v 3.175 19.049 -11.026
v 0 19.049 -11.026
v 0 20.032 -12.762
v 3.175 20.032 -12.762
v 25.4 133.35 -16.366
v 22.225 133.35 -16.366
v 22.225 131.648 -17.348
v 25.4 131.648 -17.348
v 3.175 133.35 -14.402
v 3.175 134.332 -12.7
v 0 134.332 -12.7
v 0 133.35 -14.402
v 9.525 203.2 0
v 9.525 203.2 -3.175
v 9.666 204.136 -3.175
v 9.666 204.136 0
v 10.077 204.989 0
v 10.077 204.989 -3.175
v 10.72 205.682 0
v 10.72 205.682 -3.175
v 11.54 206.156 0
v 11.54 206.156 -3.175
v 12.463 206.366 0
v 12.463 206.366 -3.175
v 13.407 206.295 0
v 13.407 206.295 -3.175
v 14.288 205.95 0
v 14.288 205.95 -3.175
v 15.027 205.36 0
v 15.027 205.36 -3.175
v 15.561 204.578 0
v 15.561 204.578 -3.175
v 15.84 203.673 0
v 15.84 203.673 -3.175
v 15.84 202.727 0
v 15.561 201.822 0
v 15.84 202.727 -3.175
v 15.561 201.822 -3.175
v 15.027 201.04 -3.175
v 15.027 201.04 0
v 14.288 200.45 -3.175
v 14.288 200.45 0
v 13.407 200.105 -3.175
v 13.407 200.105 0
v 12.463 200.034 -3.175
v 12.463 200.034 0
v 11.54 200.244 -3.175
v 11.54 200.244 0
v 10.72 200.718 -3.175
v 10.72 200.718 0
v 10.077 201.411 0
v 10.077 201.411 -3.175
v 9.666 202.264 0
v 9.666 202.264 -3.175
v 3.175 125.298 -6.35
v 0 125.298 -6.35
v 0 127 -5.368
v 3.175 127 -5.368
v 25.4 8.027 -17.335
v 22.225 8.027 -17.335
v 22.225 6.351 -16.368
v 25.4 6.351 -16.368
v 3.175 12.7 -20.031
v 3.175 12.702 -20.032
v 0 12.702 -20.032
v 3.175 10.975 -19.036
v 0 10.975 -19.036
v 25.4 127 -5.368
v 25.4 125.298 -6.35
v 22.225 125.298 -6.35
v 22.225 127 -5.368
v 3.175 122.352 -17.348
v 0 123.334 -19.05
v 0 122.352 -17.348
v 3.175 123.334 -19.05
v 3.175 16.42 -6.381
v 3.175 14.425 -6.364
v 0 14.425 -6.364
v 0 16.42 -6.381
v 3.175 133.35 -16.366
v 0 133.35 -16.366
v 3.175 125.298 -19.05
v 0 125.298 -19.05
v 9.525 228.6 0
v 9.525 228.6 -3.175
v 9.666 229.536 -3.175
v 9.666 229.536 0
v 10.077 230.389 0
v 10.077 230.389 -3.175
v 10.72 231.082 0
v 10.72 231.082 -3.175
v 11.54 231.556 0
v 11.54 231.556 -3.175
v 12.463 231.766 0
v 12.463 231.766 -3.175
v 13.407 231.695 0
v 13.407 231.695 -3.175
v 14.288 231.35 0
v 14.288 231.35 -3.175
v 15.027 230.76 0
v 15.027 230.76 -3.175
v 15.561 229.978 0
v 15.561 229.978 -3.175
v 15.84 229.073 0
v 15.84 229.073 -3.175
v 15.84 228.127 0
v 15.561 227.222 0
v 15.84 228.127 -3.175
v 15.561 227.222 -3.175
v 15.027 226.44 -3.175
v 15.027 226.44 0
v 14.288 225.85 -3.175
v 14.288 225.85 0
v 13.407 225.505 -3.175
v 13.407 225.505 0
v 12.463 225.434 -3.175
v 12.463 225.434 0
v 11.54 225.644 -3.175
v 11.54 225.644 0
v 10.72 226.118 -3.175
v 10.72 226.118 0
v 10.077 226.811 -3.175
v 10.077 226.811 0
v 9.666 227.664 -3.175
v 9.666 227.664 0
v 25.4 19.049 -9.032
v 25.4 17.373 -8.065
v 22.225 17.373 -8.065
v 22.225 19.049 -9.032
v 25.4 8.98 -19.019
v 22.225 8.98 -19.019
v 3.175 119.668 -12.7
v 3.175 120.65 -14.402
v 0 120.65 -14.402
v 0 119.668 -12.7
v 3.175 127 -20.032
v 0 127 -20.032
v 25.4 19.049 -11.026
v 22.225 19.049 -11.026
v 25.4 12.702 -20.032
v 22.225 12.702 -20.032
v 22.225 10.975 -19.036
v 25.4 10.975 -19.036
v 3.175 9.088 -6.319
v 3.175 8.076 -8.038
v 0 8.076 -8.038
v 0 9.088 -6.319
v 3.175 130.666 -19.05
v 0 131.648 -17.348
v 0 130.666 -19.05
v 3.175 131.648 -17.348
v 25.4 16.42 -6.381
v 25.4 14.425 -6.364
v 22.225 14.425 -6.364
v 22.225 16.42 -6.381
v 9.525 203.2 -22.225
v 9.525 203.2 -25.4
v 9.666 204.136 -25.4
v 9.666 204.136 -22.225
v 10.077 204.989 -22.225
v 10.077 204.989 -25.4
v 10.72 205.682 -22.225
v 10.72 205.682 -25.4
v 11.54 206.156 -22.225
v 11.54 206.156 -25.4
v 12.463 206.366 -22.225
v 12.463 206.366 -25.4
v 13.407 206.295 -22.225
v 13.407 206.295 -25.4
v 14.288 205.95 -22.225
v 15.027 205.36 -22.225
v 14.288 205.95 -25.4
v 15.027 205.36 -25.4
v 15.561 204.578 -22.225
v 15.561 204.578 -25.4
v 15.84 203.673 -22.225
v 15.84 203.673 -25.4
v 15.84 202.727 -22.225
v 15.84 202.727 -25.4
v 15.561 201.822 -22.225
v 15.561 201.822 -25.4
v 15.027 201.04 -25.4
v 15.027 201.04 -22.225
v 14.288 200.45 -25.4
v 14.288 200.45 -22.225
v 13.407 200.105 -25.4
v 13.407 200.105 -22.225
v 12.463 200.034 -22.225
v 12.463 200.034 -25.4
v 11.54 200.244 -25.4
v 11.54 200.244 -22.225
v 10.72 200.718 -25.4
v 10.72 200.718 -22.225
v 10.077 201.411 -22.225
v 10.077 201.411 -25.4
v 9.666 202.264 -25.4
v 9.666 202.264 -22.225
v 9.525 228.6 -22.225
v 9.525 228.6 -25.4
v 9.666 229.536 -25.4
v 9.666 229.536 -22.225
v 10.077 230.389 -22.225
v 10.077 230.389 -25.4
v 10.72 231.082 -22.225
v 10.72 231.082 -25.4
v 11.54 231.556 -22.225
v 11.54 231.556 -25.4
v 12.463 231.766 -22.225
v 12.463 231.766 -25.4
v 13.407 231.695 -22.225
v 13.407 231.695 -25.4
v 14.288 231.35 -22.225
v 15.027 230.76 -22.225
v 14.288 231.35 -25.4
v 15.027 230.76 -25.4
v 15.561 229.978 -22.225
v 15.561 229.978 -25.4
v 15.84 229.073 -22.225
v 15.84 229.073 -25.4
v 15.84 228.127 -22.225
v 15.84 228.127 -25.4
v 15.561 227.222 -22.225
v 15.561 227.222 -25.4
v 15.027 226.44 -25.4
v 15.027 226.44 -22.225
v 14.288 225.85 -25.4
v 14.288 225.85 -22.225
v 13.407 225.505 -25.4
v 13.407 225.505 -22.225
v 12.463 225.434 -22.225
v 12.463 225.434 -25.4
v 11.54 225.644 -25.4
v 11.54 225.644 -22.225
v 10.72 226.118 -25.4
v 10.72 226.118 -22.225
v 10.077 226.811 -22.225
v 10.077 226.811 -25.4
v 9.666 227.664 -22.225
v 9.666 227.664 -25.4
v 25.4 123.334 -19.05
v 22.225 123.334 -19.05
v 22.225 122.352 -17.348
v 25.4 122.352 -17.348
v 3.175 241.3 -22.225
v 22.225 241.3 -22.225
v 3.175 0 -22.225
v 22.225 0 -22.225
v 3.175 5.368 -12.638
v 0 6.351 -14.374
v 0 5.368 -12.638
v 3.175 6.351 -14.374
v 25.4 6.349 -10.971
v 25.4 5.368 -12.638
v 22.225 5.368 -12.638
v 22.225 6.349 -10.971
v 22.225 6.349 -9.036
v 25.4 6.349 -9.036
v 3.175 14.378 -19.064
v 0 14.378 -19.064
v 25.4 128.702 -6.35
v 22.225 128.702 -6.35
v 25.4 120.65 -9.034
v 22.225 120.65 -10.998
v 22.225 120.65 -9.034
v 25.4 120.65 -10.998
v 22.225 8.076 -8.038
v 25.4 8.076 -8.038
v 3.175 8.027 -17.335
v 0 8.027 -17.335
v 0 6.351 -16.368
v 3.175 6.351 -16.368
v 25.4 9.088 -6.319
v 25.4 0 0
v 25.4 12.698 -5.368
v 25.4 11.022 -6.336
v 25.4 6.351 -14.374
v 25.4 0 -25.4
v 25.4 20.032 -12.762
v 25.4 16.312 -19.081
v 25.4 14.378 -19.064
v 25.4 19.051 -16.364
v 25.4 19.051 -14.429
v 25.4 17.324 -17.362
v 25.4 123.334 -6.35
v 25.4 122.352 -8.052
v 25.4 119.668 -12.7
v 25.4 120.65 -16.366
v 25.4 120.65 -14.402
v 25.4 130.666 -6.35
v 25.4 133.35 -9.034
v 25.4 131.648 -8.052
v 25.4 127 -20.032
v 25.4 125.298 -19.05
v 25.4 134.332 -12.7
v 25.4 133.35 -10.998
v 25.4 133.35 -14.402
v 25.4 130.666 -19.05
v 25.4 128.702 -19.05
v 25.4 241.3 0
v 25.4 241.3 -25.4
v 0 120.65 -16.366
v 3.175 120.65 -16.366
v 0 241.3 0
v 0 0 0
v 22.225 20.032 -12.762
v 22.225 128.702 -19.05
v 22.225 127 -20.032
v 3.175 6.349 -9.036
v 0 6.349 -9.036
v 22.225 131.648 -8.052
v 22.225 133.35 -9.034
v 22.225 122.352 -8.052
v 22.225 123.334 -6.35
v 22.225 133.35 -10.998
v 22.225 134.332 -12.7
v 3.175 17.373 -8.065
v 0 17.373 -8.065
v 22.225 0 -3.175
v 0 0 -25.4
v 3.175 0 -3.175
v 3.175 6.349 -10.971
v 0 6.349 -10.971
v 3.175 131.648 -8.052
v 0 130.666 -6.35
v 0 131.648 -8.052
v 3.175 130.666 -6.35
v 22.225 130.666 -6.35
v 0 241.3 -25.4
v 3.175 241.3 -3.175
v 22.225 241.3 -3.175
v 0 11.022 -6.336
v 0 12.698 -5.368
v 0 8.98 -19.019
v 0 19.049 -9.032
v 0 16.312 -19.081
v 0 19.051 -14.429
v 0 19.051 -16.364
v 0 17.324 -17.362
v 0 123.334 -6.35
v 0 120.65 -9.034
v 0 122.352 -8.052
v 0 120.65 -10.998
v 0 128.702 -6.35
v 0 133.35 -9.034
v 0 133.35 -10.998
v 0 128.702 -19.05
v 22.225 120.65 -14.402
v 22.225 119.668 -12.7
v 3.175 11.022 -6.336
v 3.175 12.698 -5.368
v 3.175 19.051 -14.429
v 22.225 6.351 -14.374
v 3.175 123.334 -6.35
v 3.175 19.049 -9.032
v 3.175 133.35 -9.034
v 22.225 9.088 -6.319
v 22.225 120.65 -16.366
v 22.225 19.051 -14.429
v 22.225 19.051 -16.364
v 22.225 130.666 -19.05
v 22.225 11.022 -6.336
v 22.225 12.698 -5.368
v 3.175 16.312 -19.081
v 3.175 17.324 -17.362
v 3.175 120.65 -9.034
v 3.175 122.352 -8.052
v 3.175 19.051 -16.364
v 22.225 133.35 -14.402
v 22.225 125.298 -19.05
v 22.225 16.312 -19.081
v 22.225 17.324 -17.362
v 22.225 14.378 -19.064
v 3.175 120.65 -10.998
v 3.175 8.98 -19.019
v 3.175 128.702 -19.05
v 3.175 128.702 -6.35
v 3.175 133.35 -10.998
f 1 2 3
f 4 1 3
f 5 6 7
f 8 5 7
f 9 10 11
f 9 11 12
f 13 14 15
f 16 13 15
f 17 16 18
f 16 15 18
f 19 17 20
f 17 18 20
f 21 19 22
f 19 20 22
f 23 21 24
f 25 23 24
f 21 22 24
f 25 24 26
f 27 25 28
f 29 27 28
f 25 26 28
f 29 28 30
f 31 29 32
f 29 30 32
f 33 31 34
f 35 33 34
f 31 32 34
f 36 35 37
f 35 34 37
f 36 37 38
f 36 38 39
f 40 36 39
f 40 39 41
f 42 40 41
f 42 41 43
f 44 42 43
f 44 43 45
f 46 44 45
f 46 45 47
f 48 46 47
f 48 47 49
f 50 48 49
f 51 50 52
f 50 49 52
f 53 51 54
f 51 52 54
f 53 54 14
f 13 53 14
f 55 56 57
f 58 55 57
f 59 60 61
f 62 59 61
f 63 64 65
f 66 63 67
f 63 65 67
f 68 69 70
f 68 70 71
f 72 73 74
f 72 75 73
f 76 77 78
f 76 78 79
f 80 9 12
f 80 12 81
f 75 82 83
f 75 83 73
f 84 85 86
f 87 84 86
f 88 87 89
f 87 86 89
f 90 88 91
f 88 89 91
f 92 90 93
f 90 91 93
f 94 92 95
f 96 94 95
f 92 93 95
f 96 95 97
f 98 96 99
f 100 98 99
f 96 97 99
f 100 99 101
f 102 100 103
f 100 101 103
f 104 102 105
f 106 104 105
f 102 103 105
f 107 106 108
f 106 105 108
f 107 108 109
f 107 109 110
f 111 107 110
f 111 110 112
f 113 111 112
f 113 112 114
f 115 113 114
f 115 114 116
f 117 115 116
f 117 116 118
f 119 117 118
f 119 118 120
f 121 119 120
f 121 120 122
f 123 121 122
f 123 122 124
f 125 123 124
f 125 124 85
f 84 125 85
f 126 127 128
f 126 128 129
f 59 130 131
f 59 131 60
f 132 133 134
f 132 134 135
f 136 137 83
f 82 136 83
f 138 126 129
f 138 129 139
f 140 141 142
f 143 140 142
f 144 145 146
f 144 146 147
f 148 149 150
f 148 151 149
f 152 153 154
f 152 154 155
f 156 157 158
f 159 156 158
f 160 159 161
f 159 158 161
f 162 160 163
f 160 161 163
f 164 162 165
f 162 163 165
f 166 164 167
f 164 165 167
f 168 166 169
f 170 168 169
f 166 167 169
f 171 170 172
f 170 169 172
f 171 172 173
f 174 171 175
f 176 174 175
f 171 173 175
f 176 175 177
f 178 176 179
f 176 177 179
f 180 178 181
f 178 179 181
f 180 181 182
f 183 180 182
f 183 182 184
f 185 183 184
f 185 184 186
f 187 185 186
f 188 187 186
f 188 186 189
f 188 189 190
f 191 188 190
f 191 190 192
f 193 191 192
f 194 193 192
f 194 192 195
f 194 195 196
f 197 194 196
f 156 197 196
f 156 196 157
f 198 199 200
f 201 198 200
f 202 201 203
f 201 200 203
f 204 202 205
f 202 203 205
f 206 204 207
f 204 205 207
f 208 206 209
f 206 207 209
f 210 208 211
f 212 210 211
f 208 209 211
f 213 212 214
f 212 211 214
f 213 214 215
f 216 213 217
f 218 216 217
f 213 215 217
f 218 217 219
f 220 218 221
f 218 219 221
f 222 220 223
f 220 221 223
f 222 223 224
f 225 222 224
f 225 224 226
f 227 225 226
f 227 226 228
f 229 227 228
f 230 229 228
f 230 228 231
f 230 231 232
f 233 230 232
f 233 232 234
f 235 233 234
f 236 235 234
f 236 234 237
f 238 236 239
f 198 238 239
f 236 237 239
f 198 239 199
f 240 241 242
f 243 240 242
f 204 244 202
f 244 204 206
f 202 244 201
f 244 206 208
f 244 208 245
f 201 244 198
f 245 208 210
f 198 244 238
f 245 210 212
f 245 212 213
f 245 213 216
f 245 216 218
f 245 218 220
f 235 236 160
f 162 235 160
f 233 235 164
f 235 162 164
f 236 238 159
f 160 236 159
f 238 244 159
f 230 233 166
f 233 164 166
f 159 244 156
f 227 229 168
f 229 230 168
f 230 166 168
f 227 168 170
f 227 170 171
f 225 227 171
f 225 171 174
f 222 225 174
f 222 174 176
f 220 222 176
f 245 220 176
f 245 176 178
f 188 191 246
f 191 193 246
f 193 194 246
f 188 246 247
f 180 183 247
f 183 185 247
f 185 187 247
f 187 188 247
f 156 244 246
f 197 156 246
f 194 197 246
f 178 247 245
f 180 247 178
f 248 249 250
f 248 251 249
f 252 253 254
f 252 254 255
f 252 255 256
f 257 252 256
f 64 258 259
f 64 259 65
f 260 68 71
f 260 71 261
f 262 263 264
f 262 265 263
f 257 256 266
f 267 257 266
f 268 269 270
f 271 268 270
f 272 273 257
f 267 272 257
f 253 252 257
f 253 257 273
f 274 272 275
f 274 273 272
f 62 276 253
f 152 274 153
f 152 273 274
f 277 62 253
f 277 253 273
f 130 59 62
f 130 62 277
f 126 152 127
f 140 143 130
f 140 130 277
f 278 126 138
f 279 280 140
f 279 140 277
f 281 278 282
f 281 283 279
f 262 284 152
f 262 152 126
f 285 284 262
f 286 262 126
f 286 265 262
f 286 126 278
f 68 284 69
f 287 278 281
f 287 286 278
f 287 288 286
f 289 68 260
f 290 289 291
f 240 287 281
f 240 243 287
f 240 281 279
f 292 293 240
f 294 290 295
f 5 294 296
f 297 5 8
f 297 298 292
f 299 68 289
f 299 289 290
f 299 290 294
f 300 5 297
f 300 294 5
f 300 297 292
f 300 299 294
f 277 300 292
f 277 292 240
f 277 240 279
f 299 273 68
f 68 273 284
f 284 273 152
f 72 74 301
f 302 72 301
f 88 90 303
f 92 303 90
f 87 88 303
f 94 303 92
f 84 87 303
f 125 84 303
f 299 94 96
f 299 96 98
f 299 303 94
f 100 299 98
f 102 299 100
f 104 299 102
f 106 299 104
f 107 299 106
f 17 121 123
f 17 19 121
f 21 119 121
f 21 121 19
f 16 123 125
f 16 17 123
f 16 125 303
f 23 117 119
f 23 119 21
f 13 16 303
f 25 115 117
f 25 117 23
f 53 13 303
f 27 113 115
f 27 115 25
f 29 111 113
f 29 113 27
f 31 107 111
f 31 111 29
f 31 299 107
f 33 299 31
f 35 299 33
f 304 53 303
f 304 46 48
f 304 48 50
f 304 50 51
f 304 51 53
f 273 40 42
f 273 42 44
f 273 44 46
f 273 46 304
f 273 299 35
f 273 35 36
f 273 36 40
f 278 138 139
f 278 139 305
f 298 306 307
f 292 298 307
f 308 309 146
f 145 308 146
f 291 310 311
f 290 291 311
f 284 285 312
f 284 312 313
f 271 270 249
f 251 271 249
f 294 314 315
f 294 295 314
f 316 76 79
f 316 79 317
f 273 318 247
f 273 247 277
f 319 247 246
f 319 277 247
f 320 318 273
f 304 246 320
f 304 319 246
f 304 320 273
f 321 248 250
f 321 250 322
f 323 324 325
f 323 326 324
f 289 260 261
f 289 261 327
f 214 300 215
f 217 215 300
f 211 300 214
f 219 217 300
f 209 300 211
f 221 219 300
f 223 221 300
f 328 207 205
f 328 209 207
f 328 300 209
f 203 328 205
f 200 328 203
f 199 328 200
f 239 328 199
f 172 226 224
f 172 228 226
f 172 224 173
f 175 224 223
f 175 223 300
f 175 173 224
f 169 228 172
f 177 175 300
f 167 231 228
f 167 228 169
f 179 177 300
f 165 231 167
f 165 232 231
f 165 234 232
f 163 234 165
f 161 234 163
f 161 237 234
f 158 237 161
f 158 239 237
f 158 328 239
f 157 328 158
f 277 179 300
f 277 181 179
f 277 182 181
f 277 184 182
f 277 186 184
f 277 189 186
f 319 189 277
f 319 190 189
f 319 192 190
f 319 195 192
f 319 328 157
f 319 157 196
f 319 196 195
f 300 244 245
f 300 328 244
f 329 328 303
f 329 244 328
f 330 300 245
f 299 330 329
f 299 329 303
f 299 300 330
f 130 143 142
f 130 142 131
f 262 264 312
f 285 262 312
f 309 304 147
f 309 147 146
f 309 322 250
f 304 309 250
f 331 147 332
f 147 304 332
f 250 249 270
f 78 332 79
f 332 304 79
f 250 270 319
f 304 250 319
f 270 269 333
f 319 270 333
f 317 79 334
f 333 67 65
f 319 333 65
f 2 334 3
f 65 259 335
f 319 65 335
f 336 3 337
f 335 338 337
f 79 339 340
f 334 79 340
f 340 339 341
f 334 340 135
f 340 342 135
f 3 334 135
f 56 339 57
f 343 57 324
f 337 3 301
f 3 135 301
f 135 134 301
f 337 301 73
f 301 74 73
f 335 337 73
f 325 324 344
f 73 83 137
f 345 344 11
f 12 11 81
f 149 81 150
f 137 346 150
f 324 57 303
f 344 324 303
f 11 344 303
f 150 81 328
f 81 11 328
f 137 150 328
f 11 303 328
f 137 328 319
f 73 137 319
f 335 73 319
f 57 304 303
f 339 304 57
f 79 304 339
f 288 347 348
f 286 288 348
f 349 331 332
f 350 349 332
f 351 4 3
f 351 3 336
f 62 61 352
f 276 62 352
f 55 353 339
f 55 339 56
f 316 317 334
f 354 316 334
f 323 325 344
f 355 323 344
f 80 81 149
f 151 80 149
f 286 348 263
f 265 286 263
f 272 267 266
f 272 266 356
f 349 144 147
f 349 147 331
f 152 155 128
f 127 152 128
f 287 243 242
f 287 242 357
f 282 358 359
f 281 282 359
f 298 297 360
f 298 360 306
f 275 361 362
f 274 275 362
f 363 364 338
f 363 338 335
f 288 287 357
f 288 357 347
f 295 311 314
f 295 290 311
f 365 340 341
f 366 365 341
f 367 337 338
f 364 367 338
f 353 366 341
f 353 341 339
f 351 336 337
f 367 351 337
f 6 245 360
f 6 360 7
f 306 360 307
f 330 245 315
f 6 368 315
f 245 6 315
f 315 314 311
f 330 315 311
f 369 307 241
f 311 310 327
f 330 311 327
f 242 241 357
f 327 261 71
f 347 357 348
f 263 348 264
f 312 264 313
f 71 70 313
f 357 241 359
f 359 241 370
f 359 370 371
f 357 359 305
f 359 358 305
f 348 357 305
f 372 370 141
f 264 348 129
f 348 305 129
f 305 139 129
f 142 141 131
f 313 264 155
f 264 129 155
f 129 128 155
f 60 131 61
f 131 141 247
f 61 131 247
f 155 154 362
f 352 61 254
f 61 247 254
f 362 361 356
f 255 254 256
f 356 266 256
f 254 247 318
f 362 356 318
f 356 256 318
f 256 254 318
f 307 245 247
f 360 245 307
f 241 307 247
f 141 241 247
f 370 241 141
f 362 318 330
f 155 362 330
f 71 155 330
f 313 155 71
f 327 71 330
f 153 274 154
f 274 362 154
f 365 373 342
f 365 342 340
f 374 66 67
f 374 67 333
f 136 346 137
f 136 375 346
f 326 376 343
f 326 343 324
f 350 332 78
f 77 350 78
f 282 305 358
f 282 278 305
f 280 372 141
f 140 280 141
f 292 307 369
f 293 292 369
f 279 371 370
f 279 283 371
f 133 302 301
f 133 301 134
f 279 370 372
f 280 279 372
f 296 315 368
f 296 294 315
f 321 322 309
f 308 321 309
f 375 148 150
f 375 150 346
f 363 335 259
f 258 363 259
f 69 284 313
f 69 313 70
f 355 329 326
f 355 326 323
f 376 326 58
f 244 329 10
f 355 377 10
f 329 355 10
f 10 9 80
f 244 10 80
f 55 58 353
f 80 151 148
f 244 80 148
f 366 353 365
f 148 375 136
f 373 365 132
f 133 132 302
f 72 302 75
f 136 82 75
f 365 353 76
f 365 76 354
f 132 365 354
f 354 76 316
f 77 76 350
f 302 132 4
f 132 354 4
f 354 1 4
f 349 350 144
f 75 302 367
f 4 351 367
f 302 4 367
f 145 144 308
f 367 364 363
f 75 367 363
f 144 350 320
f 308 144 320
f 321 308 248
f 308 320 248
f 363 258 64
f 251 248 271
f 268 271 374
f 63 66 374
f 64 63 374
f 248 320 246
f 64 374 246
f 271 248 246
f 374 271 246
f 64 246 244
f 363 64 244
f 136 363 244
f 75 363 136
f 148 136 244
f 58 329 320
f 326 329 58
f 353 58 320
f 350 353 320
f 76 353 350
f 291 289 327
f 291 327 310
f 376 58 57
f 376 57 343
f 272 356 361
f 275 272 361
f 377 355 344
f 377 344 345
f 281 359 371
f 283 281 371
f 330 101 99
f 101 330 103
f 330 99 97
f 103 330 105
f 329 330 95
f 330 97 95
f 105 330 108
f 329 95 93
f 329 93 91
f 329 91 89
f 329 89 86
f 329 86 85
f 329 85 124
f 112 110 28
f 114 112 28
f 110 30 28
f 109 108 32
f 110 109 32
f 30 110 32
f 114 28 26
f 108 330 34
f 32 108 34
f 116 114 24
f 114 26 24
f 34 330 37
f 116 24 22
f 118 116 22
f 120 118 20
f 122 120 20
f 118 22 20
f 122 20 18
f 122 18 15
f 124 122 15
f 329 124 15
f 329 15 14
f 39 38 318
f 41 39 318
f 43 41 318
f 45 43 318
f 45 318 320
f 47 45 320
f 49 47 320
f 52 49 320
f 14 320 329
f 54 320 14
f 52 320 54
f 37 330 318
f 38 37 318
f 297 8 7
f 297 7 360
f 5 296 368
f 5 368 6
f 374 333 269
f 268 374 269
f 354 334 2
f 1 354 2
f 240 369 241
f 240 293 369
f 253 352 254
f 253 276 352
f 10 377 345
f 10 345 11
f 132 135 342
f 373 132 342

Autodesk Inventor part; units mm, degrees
ref_plane "YZ Plane" through (0, 0, 0) normal (1, 0, 0) x (0, 1, 0)
ref_plane "XZ Plane" through (0, 0, 0) normal (0, 1, 0) x (-1, 0, 0)
ref_plane "XY Plane" through (0, 0, 0) normal (0, 0, 1) x (1, 0, 0)
sketch "Sketch1" plane through (0, 0, 0) normal (1, 0, 0) x (0, 1, 0)
  line L0 (0, 0) -> (241.3, 0)
  line L1 (241.3, 0) -> (241.3, -25.4)
  line L2 (241.3, -25.4) -> (0, -25.4)
  line L3 (0, -25.4) -> (0, 0)
  line L4 (6.3489, -9.0357) -> (12.6978, -5.3677)
  line L5 (12.6978, -5.3677) -> (19.0489, -9.0319)
  line L6 (19.0489, -9.0319) -> (19.0511, -16.3643)
  line L7 (19.0511, -16.3643) -> (12.7022, -20.0323)
  line L8 (12.7022, -20.0323) -> (6.3511, -16.3681)
  line L9 (6.3511, -16.3681) -> (6.3489, -9.0357)
  point P0 (12.7, -12.7)
  dimension "d0" = 241.3
  dimension "d1" = 25.4
  dimension "d3" = 12.7
  dimension "d4" = 12.7
extrude "Extrusion1" add sketch "Sketch1" along normal blind 25.4
sketch "Sketch2" plane through (0, 241.3, 0) normal (0, 1, 0) x (1, 0, 0)
  line L0 (0, 25.4) -> (25.4, 25.4) projected
  line L1 (0, 0) -> (25.4, 0)
  line L2 (25.4, 0) -> (25.4, 25.4)
  line L3 (25.4, 25.4) -> (0, 25.4)
  line L4 (0, 25.4) -> (0, 0)
  line L5 (22.225, 3.175) -> (3.175, 3.175)
  line L6 (3.175, 3.175) -> (3.175, 22.225)
  line L7 (3.175, 22.225) -> (22.225, 22.225)
  line L8 (22.225, 22.225) -> (22.225, 3.175)
  dimension "d7" = 3.175
extrude "Extrusion2" cut sketch "Sketch2" against normal blind 228.6 contours L5 L6 L7 L8
sketch "Sketch3" plane through (25.4, 0, 0) normal (1, 0, 0) x (0, 0, -1)
  line L0 (0, 241.3) -> (0, 190.5)
  line L1 (0, 0) -> (0, 241.3) projected
  line L2 (0, 241.3) -> (-3.175, 241.3)
  line L3 (-3.175, 241.3) -> (-3.175, 190.5)
  line L4 (-3.175, 190.5) -> (0, 190.5)
  line L5 (0, 190.5) -> (0, 241.3)
  arc A0 (-3.175, 241.3) -> (-46.143, 196.9282) centre (-8.4506, 203.4185) ccw
  line L6 (-3.175, 241.3) -> (-3.175, 238.125)
  arc A1 (-3.175, 238.125) -> (-42.9327, 197.9157) centre (-7.6224, 202.7623) ccw
  line L7 (-42.9327, 197.9157) -> (-46.143, 196.9282)
  dimension "d11" = 50.8
  dimension "d13" = 3.175
  dimension "d15" = 3.175
extrude "Extrusion3" add sketch "Sketch3" against normal blind 25.4 contours L0 L4 L3 L2
sketch "Sketch4" plane through (25.4, 0, 0) normal (1, 0, 0) x (0, 0, -1)
  point P0 (0, 0)
sketch "Sketch5" plane through (25.4, 0, 0) normal (1, 0, 0) x (0, 0, -1)
  line L0 (-3.175, 241.3) -> (-3.175, 190.5) projected
  line L1 (-3.175, 241.3) -> (-3.175, 196.85)
  line L2 (-3.175, 196.85) -> (-41.275, 196.85)
  arc A0 (-3.175, 241.3) -> (-41.275, 196.85) centre (-8.1247, 206.989) ccw
  line L3 (-41.275, 196.85) -> (-38.5091, 198.4089)
  line L4 (-3.175, 241.3) -> (-3.175, 238.125)
  arc A1 (-3.175, 238.125) -> (-38.5091, 198.4089) centre (-8.433, 207.227) ccw
  point P0 (0, 0)
  dimension "d18" = 44.45
  dimension "d19" = 38.1
  dimension "d20" = 3.175
  dimension "d21" = 3.175
extrude "Extrusion4" add sketch "Sketch5" against normal blind 25.4 contours L0 A1 L3 A0
sketch "Sketch6" plane through (25.4, 0, 0) normal (1, 0, 0) x (0, 0, -1)
  line L0 (0, 0) -> (25.4, 0) projected
  line L1 (25.4, 0) -> (25.4, 241.3) projected
  line L2 (12.7618, 20.0321) -> (19.0807, 16.3125)
  line L3 (19.0807, 16.3125) -> (19.0189, 8.9804)
  line L4 (19.0189, 8.9804) -> (12.6382, 5.3679)
  line L5 (12.6382, 5.3679) -> (6.3193, 9.0875)
  line L6 (6.3193, 9.0875) -> (6.3811, 16.4196)
  line L7 (6.3811, 16.4196) -> (12.7618, 20.0321)
  point P0 (12.7, 12.7)
  point P1 (12.7, 12.7)
  dimension "d25" = 12.7
  dimension "d26" = 12.7
  dimension "d27" = 12.7
extrude "Extrusion5" cut sketch "Sketch6" against normal blind 25.4
sketch "Sketch7" plane through (25.4, 0, 0) normal (1, 0, 0) x (0, 0, -1)
  line L0 (0, 0) -> (0, 190.5) projected
  line L1 (0, 190.5) -> (-43.4485, 190.5)
  line L2 (-43.4485, 190.5) -> (-43.4485, 241.8651)
  line L3 (-43.4485, 241.8651) -> (0, 241.8651)
  line L4 (0, 241.8651) -> (0, 190.5)
extrude "Extrusion6" cut sketch "Sketch7" against normal blind 25.4
sketch "Sketch8" plane through (0, 0, -25.4) normal (0, -1, 0) x (1, 0, 0)
  line L0 (22.225, 22.225) -> (3.175, 22.225) projected
  line L1 (3.175, 3.175) -> (22.225, 3.175) projected
  line L2 (22.225, 22.225) -> (3.175, 22.225)
  line L3 (3.175, 22.225) -> (3.175, 3.175)
  line L4 (3.175, 3.175) -> (22.225, 3.175)
  line L5 (22.225, 3.175) -> (22.225, 22.225)
  point P0 (0, 25.4)
extrude "Extrusion7" cut sketch "Sketch8" against normal blind 25.4
sketch "Sketch9" plane through (25.4, 0, 0) normal (1, 0, 0) x (0, 0, -1)
  line L0 (0, 0) -> (25.4, 0) projected
  line L1 (9.0338, 133.35) -> (10.9985, 133.35)
  line L2 (14.4015, 133.35) -> (16.3662, 133.35)
  line L3 (12.7, 134.3323) -> (14.4015, 133.35)
  line L4 (17.3485, 131.6485) -> (19.05, 130.6662)
  line L5 (16.3662, 133.35) -> (17.3485, 131.6485)
  line L6 (19.05, 128.7015) -> (20.0323, 127)
  line L7 (19.05, 130.6662) -> (19.05, 128.7015)
  line L8 (19.05, 125.2985) -> (19.05, 123.3338)
  line L9 (20.0323, 127) -> (19.05, 125.2985)
  line L10 (17.3485, 122.3515) -> (16.3662, 120.65)
  line L11 (19.05, 123.3338) -> (17.3485, 122.3515)
  line L12 (14.4015, 120.65) -> (12.7, 119.6677)
  line L13 (16.3662, 120.65) -> (14.4015, 120.65)
  line L14 (10.9985, 120.65) -> (9.0338, 120.65)
  line L15 (12.7, 119.6677) -> (10.9985, 120.65)
  line L16 (8.0515, 122.3515) -> (6.35, 123.3338)
  line L17 (9.0338, 120.65) -> (8.0515, 122.3515)
  line L18 (6.35, 125.2985) -> (5.3677, 127)
  line L19 (6.35, 123.3338) -> (6.35, 125.2985)
  line L20 (6.35, 128.7015) -> (6.35, 130.6662)
  line L21 (5.3677, 127) -> (6.35, 128.7015)
  line L22 (8.0515, 131.6485) -> (9.0338, 133.35)
  line L23 (6.35, 130.6662) -> (8.0515, 131.6485)
  line L24 (10.9985, 133.35) -> (12.7, 134.3323)
  point P0 (12.7, 127)
  point P1 (12.7, 127)
  dimension "d35" = 127
extrude "Extrusion8" cut sketch "Sketch9" against normal blind 25.4
sketch "Sketch10" plane through (0, 0, -25.4) normal (0, 0, -1) x (-1, 0, 0)
  circle A0 centre (-12.7, 228.6) radius 3.175
  circle A1 centre (-12.7, 203.2) radius 3.175
  line L0 (0, 241.3) -> (-25.4, 241.3) projected
  point P0 (0, 0)
  dimension "d39" = 6.35
  dimension "d40" = 6.35
  dimension "d41" = 12.7
  dimension "d42" = 38.1
extrude "Extrusion9" cut sketch "Sketch10" against normal blind 25.4
properties part number "claw"
